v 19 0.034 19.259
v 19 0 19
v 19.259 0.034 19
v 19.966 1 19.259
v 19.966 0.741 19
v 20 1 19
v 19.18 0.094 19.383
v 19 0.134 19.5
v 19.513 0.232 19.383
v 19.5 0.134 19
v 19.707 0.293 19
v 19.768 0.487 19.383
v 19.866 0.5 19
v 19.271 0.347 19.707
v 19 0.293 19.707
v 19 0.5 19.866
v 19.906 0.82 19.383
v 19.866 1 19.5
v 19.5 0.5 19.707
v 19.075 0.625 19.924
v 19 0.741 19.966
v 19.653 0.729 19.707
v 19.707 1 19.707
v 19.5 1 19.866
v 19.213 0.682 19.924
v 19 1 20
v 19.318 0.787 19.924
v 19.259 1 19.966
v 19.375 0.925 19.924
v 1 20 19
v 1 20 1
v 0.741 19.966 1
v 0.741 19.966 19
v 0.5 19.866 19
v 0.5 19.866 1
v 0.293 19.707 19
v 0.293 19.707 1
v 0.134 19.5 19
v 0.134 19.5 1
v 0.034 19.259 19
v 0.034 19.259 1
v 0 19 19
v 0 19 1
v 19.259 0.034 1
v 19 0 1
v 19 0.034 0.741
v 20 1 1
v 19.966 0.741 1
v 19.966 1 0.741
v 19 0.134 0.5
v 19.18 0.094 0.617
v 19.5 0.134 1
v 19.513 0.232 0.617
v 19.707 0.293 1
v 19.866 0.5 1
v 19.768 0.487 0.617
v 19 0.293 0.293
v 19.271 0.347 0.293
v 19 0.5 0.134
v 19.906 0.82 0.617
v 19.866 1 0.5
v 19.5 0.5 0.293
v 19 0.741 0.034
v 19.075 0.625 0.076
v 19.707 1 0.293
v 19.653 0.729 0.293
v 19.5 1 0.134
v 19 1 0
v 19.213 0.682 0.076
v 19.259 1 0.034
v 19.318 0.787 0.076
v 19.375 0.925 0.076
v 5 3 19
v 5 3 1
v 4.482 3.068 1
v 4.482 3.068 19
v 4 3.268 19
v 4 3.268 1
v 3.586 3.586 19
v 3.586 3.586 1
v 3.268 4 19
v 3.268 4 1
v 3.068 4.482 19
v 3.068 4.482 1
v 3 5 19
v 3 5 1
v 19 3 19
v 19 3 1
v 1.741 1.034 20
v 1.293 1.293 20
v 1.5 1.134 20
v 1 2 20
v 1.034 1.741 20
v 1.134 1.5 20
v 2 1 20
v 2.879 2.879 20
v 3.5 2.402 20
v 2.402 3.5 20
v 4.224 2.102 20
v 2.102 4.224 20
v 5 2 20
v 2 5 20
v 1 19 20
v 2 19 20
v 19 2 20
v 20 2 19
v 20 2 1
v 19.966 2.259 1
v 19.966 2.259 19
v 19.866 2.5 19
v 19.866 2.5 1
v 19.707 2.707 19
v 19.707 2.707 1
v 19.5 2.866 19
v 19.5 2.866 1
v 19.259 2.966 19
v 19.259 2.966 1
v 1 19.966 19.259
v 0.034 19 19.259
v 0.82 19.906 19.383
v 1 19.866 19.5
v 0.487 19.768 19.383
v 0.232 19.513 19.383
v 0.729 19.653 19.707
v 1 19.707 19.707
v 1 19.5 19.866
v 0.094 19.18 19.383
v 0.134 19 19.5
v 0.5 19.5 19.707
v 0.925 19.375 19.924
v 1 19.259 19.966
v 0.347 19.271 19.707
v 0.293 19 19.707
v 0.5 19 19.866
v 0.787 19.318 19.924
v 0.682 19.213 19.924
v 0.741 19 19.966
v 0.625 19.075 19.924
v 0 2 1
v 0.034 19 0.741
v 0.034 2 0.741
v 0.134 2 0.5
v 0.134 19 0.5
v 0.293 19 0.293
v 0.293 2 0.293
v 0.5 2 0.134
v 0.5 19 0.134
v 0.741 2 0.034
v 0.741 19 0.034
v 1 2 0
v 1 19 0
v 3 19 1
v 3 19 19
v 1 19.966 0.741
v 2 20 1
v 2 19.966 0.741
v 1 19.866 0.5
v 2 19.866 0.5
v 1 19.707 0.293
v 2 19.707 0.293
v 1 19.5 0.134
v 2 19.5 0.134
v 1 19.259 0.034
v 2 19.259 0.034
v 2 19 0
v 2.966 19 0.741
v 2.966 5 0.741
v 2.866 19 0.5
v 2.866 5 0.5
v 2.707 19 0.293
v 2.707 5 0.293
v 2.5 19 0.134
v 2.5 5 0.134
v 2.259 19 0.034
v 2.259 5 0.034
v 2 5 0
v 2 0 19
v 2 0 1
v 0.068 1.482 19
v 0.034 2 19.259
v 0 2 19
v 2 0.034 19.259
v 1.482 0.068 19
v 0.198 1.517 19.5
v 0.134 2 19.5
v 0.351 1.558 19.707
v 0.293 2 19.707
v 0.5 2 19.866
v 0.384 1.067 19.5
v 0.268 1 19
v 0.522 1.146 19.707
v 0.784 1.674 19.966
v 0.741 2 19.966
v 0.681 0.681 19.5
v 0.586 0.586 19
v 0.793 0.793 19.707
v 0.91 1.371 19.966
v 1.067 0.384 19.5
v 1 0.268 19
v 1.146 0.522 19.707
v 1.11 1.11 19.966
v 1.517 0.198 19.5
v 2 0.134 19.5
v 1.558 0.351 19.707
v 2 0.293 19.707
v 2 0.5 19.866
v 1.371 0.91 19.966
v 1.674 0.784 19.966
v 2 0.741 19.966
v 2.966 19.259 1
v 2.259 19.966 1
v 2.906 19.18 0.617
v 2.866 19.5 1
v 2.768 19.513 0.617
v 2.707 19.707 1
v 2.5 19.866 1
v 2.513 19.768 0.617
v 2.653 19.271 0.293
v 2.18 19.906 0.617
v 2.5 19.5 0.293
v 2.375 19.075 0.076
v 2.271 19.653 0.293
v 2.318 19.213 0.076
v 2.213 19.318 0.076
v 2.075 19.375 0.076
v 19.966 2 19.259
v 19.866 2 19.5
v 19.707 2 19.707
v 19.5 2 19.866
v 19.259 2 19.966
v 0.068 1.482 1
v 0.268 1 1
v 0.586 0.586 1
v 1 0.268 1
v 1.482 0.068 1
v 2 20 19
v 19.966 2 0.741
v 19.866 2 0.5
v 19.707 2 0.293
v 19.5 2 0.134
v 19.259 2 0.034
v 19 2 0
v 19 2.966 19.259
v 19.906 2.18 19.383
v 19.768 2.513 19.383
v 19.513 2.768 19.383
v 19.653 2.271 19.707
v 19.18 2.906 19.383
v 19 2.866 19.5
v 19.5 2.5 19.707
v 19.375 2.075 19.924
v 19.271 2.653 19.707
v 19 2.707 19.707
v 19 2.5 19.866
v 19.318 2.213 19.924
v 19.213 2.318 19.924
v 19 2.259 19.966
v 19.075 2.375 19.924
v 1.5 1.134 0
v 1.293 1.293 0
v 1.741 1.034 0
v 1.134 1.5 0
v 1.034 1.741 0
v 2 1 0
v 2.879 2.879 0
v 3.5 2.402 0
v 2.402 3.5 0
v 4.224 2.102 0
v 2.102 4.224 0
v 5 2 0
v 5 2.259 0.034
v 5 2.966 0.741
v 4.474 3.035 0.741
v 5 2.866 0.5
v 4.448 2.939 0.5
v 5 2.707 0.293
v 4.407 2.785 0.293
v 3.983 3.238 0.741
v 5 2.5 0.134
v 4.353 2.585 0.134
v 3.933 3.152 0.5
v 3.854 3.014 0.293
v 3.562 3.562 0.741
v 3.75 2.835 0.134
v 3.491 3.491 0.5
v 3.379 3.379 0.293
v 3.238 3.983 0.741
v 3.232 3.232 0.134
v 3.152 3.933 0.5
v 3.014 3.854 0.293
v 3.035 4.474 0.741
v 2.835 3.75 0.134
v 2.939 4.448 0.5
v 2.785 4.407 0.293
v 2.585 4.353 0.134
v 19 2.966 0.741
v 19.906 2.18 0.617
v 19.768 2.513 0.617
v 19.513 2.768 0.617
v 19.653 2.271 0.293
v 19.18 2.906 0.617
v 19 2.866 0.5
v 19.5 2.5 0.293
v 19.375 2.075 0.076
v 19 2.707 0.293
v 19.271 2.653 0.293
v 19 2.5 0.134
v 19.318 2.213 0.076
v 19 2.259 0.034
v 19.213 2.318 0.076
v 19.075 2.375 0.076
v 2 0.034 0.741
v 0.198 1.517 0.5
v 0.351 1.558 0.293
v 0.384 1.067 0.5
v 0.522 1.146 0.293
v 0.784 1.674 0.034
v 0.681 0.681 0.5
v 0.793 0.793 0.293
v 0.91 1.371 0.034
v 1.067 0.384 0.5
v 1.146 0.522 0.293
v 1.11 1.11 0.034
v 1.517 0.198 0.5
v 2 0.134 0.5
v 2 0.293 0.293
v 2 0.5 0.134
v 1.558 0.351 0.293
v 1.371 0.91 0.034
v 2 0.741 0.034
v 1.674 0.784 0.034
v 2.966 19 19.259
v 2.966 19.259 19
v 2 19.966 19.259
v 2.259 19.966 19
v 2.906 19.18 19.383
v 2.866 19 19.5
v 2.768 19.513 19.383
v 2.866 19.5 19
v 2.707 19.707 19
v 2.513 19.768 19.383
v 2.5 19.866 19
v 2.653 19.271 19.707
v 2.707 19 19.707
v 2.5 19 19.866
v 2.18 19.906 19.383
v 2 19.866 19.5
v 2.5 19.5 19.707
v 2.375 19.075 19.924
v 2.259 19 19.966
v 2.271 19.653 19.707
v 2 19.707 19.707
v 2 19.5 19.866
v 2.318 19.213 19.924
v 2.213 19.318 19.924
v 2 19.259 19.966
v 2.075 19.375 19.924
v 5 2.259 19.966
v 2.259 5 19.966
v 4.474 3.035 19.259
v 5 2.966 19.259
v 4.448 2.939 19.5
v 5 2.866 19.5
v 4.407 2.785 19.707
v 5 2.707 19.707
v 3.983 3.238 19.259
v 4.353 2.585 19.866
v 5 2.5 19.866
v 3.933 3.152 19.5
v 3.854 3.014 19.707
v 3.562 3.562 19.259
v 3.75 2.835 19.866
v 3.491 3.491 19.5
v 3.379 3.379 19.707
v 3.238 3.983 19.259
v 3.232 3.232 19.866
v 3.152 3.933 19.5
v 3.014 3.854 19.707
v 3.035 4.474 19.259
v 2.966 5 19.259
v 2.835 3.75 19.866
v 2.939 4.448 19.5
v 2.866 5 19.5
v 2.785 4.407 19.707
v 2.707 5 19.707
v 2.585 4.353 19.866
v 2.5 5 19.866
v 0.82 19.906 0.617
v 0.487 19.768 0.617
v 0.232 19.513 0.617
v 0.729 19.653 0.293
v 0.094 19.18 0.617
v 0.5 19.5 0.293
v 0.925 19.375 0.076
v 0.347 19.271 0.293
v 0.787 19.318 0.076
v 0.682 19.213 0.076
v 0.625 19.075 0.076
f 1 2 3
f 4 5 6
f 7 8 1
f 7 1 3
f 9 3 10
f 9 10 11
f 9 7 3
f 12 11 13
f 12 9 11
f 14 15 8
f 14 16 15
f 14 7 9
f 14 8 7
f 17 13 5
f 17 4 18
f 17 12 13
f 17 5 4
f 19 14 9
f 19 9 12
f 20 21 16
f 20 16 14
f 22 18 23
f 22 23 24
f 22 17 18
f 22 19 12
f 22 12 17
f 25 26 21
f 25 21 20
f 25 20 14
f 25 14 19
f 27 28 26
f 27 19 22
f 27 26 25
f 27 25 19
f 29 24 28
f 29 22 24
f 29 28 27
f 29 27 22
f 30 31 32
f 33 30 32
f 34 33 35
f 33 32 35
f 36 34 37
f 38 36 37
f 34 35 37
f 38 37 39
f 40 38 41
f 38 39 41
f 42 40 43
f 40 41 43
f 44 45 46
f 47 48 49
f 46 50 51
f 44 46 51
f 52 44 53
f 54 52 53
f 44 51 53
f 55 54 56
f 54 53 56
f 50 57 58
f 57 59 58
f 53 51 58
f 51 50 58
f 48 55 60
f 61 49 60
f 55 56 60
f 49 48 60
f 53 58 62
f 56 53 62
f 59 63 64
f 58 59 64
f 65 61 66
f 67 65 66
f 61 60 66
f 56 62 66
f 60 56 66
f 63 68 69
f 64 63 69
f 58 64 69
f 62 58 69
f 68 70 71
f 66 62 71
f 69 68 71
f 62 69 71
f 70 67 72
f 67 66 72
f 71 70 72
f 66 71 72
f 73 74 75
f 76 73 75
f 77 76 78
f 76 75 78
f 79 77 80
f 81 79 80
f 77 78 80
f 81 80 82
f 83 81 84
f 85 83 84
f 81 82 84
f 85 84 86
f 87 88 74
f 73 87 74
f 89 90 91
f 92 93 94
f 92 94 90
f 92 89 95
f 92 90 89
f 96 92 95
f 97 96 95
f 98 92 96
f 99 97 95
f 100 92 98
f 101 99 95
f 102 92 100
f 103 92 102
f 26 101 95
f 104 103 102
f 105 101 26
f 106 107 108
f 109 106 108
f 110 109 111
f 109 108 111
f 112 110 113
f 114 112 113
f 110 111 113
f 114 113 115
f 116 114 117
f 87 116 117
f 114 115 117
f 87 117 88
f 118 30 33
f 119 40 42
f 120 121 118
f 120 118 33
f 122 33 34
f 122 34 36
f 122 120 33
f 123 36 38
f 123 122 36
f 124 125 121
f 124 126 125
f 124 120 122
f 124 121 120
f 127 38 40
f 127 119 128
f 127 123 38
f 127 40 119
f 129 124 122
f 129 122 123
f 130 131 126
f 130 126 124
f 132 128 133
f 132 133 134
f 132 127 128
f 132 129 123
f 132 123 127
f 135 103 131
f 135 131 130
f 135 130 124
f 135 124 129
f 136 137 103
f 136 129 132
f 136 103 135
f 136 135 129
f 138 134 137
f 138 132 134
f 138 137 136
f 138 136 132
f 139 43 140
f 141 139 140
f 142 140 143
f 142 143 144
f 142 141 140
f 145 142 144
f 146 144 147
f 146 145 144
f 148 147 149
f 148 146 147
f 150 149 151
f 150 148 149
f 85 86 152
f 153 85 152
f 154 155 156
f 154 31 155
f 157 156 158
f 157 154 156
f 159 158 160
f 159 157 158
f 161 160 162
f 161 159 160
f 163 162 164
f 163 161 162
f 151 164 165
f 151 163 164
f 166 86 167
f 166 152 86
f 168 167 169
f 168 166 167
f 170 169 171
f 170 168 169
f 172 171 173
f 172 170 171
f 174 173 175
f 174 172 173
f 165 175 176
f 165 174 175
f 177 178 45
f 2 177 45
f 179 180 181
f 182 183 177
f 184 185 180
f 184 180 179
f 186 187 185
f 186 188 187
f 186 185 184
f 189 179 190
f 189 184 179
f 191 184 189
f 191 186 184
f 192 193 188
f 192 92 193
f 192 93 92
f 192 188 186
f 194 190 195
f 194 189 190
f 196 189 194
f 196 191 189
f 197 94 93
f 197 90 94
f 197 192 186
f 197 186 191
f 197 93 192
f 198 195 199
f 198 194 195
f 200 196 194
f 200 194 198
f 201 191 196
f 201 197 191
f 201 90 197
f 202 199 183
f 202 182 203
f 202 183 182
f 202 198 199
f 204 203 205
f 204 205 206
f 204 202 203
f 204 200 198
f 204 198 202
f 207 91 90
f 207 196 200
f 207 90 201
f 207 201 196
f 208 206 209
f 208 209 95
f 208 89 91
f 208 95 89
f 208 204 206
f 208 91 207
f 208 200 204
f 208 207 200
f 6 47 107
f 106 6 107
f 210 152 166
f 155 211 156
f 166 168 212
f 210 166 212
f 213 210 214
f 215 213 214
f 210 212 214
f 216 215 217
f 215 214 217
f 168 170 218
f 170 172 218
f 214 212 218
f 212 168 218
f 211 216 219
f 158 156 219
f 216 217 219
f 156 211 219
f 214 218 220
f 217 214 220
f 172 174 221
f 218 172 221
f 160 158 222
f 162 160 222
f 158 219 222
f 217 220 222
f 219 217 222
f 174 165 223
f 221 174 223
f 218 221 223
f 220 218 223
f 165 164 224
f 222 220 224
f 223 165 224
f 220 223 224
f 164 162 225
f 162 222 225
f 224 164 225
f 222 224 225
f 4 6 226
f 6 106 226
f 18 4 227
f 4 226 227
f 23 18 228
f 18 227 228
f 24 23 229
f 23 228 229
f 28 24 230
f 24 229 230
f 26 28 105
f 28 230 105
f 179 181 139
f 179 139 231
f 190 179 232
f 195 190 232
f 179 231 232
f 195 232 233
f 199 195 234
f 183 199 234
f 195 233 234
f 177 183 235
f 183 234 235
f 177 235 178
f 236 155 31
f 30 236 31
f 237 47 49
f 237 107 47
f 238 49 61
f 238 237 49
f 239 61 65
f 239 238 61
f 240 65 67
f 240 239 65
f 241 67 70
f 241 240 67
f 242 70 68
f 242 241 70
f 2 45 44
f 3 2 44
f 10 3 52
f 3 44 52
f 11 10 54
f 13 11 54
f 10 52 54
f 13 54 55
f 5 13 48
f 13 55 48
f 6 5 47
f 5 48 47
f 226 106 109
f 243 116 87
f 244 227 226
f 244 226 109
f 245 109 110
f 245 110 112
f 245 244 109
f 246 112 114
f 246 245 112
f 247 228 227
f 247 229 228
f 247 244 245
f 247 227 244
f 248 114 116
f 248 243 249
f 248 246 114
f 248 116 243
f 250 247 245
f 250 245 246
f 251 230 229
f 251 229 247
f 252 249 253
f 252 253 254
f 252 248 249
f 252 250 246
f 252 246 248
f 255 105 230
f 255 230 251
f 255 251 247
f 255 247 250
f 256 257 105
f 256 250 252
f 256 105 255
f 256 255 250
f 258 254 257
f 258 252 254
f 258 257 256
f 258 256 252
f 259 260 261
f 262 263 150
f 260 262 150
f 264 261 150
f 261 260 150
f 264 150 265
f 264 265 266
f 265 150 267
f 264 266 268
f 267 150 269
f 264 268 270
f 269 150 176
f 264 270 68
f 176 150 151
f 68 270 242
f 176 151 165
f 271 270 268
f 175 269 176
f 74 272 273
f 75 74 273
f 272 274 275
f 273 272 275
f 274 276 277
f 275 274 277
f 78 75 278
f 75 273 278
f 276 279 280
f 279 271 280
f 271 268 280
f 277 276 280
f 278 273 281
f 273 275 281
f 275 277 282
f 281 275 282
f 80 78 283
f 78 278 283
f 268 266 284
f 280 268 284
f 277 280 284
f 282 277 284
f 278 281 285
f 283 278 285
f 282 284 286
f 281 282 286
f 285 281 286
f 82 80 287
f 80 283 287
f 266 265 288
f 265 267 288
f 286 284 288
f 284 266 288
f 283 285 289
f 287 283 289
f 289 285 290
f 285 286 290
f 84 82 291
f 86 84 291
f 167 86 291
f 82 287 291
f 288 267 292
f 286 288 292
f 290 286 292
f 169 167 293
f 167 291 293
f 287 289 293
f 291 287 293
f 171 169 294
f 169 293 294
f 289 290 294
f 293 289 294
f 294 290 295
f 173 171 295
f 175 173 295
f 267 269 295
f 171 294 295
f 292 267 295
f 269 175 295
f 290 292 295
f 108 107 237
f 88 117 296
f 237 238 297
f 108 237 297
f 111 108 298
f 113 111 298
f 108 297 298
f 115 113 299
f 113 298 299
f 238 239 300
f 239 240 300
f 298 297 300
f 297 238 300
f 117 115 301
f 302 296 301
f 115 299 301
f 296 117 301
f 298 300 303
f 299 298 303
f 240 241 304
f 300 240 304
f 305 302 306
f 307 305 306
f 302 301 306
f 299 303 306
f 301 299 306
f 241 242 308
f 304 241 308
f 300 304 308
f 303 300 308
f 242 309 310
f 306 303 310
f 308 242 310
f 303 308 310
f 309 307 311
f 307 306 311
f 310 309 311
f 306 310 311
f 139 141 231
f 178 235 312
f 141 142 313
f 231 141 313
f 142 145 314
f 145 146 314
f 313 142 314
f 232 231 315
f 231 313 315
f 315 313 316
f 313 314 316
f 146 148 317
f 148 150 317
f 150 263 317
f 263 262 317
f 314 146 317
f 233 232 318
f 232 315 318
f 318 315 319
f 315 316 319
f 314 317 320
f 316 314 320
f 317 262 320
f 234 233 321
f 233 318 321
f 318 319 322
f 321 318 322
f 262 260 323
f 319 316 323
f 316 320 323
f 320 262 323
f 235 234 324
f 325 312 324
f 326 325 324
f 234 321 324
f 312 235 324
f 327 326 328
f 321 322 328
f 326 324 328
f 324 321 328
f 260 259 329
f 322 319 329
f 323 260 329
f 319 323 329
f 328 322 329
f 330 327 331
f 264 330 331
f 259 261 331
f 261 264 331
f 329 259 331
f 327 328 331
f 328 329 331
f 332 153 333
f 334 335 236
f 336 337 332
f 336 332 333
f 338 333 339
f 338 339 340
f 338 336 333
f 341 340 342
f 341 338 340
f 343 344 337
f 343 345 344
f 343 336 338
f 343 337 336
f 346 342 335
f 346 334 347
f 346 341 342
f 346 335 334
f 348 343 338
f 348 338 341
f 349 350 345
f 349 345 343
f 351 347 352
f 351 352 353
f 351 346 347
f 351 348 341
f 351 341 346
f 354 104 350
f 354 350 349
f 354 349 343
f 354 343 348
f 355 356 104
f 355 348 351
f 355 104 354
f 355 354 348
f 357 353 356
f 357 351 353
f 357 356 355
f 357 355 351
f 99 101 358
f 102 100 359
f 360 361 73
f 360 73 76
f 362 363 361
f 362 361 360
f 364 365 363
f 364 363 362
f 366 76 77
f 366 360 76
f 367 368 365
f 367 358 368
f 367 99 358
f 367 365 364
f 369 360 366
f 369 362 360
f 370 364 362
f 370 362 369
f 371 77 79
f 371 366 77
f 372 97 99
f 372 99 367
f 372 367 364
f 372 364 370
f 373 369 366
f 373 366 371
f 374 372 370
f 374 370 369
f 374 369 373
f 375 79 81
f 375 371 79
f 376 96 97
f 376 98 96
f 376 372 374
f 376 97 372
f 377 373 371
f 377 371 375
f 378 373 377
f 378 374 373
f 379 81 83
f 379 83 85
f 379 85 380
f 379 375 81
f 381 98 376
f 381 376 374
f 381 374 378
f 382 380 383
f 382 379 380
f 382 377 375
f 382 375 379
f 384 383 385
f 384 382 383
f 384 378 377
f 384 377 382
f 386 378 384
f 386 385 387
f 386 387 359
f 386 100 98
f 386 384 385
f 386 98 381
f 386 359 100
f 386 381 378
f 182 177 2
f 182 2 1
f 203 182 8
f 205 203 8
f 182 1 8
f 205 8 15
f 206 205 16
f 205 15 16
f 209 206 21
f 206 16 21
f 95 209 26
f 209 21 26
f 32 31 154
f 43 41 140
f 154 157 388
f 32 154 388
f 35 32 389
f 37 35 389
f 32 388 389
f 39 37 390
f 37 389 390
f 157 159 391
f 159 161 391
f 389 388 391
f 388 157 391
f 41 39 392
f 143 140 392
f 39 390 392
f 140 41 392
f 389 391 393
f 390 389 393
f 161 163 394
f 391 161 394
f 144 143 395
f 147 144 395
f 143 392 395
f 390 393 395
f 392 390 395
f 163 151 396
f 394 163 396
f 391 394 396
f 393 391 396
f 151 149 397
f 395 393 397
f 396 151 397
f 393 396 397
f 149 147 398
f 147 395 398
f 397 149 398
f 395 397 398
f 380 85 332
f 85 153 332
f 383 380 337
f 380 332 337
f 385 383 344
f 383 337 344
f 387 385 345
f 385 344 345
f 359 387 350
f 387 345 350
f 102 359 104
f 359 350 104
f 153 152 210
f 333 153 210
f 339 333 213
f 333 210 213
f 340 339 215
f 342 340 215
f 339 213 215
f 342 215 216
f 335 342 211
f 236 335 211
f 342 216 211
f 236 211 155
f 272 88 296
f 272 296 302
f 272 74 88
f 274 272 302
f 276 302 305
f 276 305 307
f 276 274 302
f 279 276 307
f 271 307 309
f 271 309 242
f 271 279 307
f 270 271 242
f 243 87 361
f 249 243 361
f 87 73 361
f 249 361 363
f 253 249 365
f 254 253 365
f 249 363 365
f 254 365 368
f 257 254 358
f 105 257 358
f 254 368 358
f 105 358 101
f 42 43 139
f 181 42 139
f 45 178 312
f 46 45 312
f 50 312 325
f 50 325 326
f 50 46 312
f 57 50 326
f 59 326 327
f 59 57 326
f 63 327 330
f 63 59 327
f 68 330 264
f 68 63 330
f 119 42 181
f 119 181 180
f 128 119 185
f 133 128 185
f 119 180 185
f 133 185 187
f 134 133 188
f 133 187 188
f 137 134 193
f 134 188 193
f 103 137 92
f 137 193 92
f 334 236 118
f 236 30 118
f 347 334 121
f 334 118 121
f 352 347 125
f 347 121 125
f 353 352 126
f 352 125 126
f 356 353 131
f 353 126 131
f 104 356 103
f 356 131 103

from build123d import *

# Parameters (mm, degrees)
BOSS_EXTRUDE1_DEPTH = 20
FILLET1_R           = 1


with BuildPart() as part:
    # Sketch1 → Boss-Extrude1 (new body)
    with BuildSketch(Plane.XY):
        with BuildLine():
            Line((5.679190751, 0), (19, 0))
            ThreePointArc((19, 0), (19.707106781, 0.292893219), (20, 1))
            Line((20, 1), (20, 2))
            ThreePointArc((20, 2), (19.707106781, 2.707106781), (19, 3))
            Line((19, 3), (5, 3))
            ThreePointArc((5, 3), (3.585786438, 3.585786438), (3, 5))
            Line((3, 5), (3, 19))
            ThreePointArc((3, 19), (2.707106781, 19.707106781), (2, 20))
            Line((2, 20), (1, 20))
            ThreePointArc((1, 20), (0.292893219, 19.707106781), (0, 19))
            Line((0, 19), (0, 2))
            ThreePointArc((0, 2), (0.585786438, 0.585786438), (2, 0))
            Line((2, 0), (5.679190751, 0))
        make_face()
    extrude(amount=BOSS_EXTRUDE1_DEPTH)

    # Fillet1
    fillet1_edges = [part.edges().sort_by_distance(p)[0] for p in [
        (2.707106781, 19.707106781, 20),
        (12, 3, 0),
        (19.707106781, 2.707106781, 0),
        (20, 1.5, 0),
        (19.707106781, 0.292893219, 0),
        (10.5, 0, 0),
        (0.585786438, 0.585786438, 0),
        (0, 10.5, 0),
        (0.292893219, 19.707106781, 0),
        (1.5, 20, 0),
        (1.5, 20, 20),
        (2.707106781, 19.707106781, 0),
        (3, 12, 0),
        (3.585786438, 3.585786438, 0),
        (0.292893219, 19.707106781, 20),
        (0, 10.5, 20),
        (0.585786438, 0.585786438, 20),
        (10.5, 0, 20),
        (19.707106781, 0.292893219, 20),
        (20, 1.5, 20),
        (19.707106781, 2.707106781, 20),
        (3.585786438, 3.585786438, 20),
        (12, 3, 20),
        (3, 12, 20),
    ]]
    fillet(fillet1_edges, radius=FILLET1_R)


solid = part.part
